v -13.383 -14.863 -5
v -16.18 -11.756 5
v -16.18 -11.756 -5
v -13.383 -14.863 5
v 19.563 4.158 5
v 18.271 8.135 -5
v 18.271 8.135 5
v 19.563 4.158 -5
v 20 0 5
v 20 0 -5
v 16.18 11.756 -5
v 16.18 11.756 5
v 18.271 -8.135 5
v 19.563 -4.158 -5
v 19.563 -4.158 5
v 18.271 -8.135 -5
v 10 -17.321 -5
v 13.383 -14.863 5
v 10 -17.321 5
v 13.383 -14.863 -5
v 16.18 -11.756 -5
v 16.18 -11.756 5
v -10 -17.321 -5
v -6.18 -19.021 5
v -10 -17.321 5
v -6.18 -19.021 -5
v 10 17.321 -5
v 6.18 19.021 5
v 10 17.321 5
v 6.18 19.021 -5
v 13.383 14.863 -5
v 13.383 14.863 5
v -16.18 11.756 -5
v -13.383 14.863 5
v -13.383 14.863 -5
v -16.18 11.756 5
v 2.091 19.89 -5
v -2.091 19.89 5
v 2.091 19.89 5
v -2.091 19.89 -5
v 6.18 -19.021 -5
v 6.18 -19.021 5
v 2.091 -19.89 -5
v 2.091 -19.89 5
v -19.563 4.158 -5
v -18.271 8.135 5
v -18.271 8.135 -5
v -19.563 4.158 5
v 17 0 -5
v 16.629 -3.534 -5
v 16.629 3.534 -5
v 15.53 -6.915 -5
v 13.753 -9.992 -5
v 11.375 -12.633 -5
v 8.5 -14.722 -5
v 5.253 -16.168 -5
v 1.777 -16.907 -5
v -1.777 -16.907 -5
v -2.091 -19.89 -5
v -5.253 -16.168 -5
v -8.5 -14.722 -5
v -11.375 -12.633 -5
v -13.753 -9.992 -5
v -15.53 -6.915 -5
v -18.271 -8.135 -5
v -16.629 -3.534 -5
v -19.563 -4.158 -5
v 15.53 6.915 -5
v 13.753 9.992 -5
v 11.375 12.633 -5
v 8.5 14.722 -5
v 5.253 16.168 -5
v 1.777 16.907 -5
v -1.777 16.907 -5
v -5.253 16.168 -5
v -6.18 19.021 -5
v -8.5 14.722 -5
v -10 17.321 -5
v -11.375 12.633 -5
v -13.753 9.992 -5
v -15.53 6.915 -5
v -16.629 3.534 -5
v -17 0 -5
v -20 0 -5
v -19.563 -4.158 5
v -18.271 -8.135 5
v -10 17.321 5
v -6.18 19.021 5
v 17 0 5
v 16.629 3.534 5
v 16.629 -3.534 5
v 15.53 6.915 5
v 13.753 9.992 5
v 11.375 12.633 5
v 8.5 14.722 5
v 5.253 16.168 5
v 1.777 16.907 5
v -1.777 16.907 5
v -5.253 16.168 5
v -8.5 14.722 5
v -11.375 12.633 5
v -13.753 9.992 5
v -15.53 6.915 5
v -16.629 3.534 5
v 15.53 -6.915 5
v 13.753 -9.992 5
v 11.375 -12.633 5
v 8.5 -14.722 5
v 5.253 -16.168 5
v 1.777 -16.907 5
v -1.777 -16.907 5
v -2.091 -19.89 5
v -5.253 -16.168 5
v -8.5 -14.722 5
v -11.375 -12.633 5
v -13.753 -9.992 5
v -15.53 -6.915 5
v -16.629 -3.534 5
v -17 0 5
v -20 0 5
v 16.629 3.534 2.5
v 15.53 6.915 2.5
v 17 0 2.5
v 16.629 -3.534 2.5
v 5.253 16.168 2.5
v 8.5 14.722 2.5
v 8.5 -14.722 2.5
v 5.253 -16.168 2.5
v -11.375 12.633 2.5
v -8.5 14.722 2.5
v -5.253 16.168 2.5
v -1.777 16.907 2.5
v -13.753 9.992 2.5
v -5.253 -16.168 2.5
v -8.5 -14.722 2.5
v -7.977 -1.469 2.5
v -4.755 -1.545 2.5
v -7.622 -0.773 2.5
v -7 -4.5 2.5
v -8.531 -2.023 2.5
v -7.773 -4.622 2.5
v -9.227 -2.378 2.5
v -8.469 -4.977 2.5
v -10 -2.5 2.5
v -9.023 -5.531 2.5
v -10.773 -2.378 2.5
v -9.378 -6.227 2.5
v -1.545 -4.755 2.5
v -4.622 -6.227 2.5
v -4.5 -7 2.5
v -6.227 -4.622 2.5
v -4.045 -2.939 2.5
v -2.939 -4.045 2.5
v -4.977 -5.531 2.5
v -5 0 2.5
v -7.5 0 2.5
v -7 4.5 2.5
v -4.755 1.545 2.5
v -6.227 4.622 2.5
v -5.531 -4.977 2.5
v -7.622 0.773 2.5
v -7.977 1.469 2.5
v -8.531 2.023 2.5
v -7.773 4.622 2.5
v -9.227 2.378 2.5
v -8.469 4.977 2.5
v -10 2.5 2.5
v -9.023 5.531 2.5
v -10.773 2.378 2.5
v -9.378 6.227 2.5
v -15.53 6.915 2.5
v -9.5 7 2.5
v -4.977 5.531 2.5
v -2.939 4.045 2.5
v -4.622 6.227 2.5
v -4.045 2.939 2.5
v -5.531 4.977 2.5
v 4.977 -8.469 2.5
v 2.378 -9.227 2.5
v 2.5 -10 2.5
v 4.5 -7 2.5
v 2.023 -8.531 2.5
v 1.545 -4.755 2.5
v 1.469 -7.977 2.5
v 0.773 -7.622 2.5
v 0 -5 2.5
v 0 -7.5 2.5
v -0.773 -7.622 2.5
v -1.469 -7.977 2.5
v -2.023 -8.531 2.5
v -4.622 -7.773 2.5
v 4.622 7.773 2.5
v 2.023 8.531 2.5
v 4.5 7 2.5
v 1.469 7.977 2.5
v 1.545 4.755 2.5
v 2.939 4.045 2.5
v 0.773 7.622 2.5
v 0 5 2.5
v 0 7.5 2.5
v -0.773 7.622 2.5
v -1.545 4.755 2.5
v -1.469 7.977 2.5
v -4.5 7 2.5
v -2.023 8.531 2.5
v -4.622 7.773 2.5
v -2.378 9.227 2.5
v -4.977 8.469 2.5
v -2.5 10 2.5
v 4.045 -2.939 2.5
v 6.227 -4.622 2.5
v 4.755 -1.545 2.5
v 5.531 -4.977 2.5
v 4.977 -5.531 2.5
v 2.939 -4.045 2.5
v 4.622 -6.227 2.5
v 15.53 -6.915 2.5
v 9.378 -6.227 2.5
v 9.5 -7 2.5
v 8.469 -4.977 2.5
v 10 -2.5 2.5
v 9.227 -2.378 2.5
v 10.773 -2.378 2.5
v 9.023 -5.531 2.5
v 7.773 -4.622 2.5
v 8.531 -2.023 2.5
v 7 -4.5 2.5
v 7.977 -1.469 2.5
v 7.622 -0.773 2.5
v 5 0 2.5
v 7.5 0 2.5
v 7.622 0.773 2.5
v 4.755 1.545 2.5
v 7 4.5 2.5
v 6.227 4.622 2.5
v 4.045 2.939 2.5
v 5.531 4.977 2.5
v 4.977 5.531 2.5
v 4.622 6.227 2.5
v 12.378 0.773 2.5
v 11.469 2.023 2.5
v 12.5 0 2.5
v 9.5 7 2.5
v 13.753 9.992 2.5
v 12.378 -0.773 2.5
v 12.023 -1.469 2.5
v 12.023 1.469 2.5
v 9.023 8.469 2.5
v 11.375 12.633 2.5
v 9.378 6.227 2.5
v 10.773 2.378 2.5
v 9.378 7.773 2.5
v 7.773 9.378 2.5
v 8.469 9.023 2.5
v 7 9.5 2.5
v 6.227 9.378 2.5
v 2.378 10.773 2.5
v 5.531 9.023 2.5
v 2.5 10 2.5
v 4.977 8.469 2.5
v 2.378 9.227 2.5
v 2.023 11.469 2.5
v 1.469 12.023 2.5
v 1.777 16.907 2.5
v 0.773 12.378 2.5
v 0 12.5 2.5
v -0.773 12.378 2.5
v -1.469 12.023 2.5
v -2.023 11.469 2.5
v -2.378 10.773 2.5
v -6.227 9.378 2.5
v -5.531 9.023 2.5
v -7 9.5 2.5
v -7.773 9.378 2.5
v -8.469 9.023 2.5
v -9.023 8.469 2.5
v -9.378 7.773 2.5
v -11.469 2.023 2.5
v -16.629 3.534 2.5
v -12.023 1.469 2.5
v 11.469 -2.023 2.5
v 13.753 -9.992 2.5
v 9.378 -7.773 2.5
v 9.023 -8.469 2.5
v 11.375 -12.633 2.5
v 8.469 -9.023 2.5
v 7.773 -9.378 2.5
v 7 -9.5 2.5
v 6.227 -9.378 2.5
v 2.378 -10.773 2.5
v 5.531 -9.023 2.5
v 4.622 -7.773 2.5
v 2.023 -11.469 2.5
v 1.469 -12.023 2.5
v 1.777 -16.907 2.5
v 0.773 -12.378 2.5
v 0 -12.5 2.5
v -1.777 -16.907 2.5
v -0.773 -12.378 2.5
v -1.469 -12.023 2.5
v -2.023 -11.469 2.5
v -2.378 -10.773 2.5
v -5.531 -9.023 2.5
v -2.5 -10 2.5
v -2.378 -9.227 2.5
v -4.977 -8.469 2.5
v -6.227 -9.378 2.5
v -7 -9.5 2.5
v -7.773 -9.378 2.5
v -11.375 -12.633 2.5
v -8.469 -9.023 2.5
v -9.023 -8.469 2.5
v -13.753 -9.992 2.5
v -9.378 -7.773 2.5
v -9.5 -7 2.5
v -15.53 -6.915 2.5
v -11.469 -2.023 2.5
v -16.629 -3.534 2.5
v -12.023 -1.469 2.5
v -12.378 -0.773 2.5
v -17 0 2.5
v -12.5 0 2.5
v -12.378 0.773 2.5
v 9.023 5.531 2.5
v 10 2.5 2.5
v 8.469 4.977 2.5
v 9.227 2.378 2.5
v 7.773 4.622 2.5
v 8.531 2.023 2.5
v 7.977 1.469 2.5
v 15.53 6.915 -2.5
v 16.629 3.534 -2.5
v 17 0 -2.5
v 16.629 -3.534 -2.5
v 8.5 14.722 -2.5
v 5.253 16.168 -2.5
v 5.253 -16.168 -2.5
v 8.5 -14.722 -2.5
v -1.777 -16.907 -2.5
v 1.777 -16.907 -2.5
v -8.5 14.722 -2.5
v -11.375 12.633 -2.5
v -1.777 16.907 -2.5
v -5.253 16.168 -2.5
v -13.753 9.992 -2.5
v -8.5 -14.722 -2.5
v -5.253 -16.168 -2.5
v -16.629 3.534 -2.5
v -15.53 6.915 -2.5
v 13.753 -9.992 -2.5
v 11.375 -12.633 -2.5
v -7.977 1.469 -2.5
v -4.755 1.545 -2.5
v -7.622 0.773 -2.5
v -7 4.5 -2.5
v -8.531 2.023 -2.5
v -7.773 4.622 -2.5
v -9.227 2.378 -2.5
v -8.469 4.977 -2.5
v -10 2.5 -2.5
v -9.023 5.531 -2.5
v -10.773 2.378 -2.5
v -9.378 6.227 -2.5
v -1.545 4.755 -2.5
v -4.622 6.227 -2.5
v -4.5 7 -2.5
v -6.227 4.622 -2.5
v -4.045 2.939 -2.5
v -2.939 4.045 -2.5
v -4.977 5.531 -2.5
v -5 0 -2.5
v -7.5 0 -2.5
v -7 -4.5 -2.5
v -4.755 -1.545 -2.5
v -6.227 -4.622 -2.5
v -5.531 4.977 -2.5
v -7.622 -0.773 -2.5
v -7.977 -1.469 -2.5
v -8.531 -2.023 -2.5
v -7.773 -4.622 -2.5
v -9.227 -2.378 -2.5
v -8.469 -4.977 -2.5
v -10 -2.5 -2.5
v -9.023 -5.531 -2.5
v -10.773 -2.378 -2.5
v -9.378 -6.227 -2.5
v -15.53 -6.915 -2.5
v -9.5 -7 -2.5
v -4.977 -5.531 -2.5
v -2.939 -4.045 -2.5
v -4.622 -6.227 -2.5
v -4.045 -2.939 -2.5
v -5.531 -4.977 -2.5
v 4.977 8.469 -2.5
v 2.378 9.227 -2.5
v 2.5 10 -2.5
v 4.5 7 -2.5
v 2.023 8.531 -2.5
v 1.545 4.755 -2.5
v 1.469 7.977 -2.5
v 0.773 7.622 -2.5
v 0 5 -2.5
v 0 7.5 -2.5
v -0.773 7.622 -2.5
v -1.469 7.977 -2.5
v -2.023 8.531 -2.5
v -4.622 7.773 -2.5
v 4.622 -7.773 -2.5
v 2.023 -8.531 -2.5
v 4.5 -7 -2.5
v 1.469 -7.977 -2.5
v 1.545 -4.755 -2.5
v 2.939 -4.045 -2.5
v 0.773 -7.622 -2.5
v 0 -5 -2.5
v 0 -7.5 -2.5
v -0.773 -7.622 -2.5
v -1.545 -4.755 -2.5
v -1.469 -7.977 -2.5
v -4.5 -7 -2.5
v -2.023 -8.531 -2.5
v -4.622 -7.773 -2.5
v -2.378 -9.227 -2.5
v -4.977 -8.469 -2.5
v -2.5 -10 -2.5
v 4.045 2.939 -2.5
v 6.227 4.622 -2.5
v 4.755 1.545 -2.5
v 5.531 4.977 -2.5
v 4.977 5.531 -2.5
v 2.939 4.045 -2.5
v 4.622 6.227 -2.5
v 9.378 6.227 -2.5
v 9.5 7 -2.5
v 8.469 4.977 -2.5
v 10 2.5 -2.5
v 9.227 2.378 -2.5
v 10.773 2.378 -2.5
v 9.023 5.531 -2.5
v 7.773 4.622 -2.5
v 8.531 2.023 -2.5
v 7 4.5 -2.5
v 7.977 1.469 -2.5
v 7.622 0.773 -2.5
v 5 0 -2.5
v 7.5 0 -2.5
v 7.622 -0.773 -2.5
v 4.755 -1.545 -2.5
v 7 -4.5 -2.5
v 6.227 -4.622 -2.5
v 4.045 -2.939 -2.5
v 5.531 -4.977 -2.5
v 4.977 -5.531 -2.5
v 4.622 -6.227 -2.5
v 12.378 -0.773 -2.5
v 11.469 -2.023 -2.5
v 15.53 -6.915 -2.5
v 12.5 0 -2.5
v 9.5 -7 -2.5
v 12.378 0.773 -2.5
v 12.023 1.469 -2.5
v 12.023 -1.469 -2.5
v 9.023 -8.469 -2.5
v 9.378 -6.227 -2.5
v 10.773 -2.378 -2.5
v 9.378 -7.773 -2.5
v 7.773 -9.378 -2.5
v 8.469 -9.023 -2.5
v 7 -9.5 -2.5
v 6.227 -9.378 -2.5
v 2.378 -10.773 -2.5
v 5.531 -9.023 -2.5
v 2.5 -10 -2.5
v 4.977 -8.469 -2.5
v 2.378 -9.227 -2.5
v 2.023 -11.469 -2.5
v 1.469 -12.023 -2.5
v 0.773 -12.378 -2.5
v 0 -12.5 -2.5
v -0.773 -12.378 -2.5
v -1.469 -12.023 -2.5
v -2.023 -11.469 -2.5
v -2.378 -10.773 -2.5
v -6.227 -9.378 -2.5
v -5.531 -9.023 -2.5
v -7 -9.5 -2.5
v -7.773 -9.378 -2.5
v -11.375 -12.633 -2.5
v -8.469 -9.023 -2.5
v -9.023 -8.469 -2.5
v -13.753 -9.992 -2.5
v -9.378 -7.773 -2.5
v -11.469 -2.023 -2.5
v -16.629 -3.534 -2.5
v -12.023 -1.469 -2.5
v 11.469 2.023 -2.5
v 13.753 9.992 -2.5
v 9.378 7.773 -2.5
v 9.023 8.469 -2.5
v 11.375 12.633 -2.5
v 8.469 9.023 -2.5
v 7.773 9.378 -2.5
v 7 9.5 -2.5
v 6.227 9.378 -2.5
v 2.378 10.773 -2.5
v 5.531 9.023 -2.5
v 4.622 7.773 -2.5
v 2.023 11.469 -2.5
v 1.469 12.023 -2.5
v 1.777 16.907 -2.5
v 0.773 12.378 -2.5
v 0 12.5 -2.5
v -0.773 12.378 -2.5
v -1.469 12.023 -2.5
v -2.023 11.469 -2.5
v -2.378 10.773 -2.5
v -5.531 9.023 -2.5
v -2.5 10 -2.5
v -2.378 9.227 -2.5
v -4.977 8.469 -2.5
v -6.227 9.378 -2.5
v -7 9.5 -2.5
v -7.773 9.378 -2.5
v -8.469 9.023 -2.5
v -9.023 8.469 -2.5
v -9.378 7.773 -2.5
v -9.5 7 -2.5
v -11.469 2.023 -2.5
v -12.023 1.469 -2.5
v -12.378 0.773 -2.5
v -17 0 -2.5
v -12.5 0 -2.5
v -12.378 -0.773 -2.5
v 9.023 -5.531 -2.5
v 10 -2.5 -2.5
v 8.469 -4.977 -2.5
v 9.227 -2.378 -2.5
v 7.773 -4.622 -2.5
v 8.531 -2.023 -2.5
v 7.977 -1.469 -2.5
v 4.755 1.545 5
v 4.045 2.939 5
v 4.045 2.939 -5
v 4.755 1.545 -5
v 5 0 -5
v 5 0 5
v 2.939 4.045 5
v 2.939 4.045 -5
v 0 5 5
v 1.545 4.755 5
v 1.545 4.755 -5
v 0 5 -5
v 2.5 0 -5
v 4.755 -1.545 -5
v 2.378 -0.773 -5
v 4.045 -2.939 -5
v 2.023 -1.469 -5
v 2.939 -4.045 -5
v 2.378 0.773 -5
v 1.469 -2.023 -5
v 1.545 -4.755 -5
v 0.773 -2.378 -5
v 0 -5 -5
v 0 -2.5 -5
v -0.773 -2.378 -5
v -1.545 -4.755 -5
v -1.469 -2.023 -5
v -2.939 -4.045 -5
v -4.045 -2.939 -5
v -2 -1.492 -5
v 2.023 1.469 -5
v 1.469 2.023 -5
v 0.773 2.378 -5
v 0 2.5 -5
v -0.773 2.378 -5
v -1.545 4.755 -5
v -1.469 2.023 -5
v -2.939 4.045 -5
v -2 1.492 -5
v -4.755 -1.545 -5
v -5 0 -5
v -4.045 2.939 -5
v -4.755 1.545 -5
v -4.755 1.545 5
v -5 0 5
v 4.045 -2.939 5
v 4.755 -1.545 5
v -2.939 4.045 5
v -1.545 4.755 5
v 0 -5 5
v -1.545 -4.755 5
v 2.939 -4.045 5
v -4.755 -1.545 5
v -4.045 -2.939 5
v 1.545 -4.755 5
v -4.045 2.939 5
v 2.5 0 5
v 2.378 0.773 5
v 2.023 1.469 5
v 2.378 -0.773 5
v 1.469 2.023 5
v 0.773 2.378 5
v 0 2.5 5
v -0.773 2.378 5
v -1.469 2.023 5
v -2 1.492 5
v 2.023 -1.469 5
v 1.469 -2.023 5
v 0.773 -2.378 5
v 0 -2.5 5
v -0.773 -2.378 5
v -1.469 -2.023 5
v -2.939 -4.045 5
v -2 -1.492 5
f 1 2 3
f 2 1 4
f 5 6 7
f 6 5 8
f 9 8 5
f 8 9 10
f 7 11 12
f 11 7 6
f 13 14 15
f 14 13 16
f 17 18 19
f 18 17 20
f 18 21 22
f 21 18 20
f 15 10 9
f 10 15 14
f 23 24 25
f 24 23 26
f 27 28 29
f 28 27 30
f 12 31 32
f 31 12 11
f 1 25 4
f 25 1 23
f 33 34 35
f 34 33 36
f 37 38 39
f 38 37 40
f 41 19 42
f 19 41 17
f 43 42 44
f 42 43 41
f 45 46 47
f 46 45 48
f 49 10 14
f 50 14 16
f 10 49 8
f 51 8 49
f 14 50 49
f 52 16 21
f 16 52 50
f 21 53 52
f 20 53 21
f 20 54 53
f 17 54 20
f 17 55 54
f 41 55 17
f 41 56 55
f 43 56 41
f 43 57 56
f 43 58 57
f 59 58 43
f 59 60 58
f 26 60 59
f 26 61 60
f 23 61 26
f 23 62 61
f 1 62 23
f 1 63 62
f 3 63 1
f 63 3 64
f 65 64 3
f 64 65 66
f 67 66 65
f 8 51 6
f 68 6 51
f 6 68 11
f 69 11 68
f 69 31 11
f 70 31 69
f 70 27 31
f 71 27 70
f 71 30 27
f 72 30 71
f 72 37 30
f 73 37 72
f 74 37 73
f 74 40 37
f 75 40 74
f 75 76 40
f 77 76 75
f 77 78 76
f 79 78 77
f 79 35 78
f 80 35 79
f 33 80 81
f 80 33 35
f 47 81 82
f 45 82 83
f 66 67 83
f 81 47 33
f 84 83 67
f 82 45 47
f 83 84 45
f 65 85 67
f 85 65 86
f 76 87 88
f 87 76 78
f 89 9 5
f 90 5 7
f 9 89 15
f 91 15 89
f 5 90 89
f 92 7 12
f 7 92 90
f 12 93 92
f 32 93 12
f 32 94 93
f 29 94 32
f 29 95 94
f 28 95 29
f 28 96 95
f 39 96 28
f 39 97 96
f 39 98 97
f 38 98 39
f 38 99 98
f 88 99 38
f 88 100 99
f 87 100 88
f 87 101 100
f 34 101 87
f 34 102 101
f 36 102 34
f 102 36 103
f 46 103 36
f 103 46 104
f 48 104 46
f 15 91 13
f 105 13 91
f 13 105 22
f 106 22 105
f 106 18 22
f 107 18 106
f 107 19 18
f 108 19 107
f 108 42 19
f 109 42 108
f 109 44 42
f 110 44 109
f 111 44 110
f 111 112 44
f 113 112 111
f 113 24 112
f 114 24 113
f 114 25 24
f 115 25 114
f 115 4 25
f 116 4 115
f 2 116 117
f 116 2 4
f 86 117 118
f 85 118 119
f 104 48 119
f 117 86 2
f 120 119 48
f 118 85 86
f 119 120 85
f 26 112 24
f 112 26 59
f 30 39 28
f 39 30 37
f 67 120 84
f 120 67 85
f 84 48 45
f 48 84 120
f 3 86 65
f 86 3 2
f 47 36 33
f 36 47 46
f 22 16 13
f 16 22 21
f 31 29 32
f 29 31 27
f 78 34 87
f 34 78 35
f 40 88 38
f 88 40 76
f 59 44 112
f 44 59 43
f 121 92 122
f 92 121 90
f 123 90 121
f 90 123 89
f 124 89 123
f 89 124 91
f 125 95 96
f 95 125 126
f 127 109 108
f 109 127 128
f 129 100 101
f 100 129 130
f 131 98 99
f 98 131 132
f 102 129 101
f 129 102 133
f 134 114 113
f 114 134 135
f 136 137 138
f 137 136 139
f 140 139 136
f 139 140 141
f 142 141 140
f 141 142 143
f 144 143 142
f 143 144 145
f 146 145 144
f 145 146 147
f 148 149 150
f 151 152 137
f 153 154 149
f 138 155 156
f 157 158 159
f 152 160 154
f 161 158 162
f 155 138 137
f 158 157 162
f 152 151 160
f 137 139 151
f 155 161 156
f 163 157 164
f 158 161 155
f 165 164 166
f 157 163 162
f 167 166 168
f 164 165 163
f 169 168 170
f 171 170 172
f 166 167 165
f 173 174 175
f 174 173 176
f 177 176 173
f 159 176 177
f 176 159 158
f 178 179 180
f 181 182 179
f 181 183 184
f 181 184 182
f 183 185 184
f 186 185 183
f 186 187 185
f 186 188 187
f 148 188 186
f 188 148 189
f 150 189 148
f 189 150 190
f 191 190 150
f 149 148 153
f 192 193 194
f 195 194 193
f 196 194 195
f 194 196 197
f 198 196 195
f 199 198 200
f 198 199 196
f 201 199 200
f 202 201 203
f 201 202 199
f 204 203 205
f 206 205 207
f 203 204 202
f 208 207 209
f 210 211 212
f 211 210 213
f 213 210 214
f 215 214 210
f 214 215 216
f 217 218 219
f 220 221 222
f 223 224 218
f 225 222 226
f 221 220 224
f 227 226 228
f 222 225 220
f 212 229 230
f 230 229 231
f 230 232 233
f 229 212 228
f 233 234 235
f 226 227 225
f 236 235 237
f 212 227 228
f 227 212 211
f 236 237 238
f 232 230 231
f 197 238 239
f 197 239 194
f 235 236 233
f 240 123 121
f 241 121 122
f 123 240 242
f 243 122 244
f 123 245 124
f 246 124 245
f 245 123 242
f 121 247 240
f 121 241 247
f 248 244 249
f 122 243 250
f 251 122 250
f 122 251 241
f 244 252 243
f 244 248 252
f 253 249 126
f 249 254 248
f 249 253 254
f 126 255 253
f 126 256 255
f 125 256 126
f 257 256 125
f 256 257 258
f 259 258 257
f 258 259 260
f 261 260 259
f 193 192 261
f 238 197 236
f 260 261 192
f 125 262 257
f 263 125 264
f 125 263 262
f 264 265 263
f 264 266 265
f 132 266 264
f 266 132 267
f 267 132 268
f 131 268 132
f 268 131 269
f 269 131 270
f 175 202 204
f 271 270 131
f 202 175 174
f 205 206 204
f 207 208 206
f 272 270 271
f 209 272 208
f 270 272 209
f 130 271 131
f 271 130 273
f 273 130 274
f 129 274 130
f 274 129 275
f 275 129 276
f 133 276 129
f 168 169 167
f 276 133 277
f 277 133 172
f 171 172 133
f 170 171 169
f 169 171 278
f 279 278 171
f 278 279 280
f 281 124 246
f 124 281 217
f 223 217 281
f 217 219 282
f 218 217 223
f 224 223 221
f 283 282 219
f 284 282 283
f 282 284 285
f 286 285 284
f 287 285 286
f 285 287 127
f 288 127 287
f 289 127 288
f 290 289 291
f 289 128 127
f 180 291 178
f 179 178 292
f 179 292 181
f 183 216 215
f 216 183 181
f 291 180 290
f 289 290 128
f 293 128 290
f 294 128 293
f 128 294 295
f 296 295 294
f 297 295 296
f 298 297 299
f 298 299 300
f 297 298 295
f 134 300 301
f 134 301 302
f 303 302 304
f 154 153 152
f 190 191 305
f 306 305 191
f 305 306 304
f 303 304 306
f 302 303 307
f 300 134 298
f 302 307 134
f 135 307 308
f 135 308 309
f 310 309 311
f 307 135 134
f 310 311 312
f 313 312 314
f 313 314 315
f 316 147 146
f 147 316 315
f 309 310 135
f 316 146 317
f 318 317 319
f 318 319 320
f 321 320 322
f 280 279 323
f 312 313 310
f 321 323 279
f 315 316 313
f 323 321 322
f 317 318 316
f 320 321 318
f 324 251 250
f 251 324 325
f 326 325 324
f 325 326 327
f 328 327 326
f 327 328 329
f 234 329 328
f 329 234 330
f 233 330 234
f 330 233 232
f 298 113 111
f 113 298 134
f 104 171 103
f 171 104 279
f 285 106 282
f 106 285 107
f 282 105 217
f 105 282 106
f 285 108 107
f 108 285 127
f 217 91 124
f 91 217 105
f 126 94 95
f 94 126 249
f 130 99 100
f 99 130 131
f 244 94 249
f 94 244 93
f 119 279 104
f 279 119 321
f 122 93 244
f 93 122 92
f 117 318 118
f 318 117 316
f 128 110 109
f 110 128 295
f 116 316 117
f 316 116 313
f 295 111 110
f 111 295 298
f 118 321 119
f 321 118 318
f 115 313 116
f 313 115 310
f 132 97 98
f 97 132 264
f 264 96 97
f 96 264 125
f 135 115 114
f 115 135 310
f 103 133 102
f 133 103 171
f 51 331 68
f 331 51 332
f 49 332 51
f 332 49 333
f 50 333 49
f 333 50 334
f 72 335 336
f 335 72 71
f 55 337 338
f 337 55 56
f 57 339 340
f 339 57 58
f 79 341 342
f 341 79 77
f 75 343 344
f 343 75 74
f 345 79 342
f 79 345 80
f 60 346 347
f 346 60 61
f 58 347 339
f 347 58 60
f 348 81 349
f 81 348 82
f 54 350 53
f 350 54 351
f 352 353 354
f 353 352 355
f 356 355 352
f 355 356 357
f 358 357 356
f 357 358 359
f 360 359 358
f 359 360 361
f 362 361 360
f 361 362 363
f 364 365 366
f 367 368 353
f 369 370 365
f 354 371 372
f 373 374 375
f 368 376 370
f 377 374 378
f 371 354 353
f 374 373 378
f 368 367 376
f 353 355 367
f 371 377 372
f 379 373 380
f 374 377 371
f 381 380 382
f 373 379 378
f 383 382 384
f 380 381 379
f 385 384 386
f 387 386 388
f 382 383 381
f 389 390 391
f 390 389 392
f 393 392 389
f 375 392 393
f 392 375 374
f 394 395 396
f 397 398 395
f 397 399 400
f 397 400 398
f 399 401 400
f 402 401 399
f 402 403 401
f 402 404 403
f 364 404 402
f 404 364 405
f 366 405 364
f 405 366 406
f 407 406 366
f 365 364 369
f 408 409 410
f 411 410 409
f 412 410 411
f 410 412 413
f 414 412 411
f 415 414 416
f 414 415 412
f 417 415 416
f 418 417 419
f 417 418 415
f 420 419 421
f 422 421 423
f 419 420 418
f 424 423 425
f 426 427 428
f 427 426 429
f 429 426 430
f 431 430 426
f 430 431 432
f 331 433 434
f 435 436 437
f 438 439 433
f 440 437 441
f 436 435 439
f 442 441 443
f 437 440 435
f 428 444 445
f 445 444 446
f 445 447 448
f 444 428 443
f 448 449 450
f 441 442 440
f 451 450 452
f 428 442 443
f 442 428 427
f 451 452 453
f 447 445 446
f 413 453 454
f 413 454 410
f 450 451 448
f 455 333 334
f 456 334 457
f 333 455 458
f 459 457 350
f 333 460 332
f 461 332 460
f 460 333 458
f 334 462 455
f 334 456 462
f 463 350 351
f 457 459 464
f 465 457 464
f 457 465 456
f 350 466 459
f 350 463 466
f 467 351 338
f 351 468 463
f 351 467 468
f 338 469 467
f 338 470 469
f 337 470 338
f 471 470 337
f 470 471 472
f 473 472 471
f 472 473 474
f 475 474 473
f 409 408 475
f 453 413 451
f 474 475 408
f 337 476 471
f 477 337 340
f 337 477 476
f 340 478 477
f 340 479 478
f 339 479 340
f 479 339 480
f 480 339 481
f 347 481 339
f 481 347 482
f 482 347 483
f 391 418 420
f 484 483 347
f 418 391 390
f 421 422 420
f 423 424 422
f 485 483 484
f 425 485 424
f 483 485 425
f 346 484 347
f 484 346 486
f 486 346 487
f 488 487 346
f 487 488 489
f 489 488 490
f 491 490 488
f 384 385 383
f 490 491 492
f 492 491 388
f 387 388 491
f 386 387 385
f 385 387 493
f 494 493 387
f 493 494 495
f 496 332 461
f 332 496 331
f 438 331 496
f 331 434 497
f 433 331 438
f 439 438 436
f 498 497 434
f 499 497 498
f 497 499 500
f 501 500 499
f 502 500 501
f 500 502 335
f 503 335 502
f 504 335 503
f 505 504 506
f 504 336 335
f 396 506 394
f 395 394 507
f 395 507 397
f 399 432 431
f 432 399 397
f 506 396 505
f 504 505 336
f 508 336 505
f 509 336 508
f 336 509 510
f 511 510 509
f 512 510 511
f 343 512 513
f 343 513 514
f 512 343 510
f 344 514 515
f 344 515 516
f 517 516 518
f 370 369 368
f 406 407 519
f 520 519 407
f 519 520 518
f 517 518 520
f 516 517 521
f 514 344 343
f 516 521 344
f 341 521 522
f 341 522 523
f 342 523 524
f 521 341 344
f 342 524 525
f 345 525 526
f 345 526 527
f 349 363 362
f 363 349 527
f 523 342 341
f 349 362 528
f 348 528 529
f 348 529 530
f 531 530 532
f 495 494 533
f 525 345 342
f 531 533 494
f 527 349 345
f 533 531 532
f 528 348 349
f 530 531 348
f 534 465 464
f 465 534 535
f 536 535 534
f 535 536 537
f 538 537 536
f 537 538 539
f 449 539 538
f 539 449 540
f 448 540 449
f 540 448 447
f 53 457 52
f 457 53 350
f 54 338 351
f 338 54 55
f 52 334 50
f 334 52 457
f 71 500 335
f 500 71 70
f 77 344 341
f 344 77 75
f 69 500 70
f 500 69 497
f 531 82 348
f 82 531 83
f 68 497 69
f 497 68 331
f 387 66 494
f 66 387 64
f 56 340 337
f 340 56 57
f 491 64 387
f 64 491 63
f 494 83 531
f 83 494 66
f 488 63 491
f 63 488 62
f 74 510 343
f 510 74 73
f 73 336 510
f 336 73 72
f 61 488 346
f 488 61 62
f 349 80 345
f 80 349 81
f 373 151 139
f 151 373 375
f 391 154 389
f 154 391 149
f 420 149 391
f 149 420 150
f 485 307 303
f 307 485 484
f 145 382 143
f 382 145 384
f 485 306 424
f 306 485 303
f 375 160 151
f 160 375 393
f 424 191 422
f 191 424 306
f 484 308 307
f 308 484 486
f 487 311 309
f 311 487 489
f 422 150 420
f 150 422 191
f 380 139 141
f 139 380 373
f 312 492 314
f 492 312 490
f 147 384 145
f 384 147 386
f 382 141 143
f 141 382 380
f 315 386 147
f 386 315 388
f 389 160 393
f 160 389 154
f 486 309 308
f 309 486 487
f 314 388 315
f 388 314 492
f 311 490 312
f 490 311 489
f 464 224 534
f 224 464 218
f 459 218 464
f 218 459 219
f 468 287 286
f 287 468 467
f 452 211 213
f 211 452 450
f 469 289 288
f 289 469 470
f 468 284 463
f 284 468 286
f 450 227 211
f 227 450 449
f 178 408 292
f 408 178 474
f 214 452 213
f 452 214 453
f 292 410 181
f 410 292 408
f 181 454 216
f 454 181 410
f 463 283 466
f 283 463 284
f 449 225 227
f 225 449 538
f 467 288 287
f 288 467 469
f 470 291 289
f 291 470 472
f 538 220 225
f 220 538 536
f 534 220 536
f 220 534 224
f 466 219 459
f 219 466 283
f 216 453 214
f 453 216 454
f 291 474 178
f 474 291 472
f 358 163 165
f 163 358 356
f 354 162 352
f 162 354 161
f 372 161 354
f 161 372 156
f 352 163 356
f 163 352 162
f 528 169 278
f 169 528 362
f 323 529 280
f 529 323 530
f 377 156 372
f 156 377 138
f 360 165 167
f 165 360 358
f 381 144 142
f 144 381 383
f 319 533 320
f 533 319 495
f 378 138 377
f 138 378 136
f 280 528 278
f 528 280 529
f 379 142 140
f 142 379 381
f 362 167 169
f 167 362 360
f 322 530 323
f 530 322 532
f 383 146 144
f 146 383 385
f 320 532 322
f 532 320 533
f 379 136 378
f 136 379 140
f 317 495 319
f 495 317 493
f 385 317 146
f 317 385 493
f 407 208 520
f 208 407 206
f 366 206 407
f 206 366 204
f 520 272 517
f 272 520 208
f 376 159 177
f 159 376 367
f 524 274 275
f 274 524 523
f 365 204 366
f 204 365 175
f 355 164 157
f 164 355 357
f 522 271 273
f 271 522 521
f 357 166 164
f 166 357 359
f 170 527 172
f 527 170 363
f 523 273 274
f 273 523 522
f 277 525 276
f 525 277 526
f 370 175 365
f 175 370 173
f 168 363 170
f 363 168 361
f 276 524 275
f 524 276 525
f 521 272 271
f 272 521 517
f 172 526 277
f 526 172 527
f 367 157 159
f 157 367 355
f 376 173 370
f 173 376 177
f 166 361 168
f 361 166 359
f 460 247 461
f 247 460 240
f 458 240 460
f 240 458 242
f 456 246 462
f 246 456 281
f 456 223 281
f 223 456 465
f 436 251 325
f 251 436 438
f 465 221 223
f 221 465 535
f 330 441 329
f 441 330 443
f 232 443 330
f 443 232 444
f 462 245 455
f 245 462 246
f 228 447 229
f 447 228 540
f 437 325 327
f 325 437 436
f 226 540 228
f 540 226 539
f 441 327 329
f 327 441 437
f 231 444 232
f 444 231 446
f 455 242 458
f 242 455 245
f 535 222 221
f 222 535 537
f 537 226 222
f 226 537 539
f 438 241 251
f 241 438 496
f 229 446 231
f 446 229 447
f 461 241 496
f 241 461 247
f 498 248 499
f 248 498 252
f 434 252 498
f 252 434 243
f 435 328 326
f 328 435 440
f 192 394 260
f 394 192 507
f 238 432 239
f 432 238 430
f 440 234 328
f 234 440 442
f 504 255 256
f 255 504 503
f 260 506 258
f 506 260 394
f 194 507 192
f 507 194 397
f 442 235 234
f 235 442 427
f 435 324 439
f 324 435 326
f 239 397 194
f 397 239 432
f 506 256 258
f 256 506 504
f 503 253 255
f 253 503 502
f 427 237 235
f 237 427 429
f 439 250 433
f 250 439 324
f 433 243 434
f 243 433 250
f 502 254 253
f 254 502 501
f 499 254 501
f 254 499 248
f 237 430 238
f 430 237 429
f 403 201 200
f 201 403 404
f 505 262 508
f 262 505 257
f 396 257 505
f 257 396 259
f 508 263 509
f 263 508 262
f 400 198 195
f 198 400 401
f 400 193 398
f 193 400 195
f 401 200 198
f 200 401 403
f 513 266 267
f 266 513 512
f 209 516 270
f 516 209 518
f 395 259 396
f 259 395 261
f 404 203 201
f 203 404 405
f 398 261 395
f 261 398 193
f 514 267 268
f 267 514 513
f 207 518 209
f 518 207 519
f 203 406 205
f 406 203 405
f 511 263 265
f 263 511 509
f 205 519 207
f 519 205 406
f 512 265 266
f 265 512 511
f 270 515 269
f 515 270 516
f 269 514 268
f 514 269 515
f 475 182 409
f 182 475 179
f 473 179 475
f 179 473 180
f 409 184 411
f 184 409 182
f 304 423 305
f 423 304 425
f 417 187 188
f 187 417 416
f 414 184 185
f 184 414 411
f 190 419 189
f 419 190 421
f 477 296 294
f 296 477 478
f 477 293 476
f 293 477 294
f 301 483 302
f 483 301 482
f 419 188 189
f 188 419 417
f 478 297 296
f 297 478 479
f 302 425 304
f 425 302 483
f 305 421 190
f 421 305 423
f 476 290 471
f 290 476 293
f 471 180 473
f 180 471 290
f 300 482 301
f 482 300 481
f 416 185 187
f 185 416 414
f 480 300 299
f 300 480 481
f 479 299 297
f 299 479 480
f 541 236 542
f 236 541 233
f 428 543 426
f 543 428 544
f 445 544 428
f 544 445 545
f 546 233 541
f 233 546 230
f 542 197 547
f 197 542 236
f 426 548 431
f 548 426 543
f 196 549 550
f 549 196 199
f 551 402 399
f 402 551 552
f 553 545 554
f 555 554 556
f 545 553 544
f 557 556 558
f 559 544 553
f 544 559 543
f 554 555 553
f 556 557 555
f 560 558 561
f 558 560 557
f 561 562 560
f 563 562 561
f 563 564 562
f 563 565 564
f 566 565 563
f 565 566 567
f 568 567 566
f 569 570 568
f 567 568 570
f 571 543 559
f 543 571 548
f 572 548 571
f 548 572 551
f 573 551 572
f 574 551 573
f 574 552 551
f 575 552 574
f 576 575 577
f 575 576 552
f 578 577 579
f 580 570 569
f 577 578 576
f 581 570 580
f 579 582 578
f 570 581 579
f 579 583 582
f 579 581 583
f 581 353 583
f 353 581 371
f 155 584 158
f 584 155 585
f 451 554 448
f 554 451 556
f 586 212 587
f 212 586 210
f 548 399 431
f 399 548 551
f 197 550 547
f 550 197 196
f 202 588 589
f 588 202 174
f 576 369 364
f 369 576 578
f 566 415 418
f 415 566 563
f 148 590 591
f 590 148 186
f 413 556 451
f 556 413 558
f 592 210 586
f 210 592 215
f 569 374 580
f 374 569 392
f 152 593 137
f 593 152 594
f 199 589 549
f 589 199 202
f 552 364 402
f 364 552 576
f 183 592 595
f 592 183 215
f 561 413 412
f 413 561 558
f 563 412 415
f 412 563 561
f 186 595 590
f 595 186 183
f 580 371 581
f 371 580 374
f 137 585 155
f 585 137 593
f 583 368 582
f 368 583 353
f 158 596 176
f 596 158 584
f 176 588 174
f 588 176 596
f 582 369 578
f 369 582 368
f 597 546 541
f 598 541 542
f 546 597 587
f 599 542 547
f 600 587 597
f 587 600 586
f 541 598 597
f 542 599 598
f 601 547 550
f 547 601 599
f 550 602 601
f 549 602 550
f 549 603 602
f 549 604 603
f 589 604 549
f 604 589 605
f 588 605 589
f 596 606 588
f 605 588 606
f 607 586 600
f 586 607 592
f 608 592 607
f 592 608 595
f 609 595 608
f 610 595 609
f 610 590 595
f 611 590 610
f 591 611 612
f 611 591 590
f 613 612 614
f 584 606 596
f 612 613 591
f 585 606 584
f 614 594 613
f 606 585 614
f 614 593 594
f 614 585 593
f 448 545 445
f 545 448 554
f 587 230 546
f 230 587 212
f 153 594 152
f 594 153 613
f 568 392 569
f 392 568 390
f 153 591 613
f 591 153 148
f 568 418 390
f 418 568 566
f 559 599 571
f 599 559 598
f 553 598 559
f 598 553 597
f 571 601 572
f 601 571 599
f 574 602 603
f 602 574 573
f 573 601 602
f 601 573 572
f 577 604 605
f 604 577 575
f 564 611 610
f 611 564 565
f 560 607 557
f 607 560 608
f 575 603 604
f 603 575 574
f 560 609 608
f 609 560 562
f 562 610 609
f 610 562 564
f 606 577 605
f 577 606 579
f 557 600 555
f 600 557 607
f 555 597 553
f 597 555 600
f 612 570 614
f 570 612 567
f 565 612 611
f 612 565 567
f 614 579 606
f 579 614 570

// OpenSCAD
module rueda(radioRueda,ancho,radioInterno, anchoInterno, radioPalier, anchoPalier, radioagujero, anchoagujero, offsetAgujero){ 
    difference(){
        union(){
            difference(){
                // rueda
                cylinder(h= ancho, r = radioRueda, center = true);
                translate([0, 0, 4])
                // rueda interna
                cylinder(h= anchoInterno, r = radioInterno, center = true);
                translate([0, 0, -4])
                // rueda interna
                cylinder(h= anchoInterno, r = radioInterno, center = true);
                
                //Agujeros de la rueda
                translate([-7,-7,-5])
                    cylinder(h = anchoagujero, r = radioagujero, $fn=offsetAgujero);
                translate([7,-7,-5])
                    cylinder(h = anchoagujero, r = radioagujero, $fn=offsetAgujero);
                translate([-10,0,-5])
                    cylinder(h = anchoagujero, r = radioagujero, $fn=offsetAgujero);
                translate([-7, 7, -5])
                    cylinder(h = anchoagujero, r = radioagujero, $fn=offsetAgujero);
                translate([10,0, -5])
                    cylinder(h = anchoagujero, r = radioagujero, $fn=offsetAgujero);
                translate([7, 7, -5])
                    cylinder(h = anchoagujero, r = radioagujero, $fn=offsetAgujero);
                translate([0, 10, -5])
                    cylinder(h = anchoagujero, r = radioagujero, $fn=offsetAgujero);
                translate([0, -10, -5])
                    cylinder(h = anchoagujero, r = radioagujero, $fn=offsetAgujero);           
            }
            //Palier
                cylinder(h= anchoPalier, r = radioPalier, center = true, $fn=offsetAgujero);
    }
            intersection() {
                //Agujero central
                translate([0, 0, -5])
                    cylinder(h = anchoagujero*2, r = radioagujero, $fn=offsetAgujero);  
                        translate([3,0,0])
                            cube(10, center = true);
}
            
}
}

rueda(20,10,17,3,5,10, 2.5, 10, 20);
